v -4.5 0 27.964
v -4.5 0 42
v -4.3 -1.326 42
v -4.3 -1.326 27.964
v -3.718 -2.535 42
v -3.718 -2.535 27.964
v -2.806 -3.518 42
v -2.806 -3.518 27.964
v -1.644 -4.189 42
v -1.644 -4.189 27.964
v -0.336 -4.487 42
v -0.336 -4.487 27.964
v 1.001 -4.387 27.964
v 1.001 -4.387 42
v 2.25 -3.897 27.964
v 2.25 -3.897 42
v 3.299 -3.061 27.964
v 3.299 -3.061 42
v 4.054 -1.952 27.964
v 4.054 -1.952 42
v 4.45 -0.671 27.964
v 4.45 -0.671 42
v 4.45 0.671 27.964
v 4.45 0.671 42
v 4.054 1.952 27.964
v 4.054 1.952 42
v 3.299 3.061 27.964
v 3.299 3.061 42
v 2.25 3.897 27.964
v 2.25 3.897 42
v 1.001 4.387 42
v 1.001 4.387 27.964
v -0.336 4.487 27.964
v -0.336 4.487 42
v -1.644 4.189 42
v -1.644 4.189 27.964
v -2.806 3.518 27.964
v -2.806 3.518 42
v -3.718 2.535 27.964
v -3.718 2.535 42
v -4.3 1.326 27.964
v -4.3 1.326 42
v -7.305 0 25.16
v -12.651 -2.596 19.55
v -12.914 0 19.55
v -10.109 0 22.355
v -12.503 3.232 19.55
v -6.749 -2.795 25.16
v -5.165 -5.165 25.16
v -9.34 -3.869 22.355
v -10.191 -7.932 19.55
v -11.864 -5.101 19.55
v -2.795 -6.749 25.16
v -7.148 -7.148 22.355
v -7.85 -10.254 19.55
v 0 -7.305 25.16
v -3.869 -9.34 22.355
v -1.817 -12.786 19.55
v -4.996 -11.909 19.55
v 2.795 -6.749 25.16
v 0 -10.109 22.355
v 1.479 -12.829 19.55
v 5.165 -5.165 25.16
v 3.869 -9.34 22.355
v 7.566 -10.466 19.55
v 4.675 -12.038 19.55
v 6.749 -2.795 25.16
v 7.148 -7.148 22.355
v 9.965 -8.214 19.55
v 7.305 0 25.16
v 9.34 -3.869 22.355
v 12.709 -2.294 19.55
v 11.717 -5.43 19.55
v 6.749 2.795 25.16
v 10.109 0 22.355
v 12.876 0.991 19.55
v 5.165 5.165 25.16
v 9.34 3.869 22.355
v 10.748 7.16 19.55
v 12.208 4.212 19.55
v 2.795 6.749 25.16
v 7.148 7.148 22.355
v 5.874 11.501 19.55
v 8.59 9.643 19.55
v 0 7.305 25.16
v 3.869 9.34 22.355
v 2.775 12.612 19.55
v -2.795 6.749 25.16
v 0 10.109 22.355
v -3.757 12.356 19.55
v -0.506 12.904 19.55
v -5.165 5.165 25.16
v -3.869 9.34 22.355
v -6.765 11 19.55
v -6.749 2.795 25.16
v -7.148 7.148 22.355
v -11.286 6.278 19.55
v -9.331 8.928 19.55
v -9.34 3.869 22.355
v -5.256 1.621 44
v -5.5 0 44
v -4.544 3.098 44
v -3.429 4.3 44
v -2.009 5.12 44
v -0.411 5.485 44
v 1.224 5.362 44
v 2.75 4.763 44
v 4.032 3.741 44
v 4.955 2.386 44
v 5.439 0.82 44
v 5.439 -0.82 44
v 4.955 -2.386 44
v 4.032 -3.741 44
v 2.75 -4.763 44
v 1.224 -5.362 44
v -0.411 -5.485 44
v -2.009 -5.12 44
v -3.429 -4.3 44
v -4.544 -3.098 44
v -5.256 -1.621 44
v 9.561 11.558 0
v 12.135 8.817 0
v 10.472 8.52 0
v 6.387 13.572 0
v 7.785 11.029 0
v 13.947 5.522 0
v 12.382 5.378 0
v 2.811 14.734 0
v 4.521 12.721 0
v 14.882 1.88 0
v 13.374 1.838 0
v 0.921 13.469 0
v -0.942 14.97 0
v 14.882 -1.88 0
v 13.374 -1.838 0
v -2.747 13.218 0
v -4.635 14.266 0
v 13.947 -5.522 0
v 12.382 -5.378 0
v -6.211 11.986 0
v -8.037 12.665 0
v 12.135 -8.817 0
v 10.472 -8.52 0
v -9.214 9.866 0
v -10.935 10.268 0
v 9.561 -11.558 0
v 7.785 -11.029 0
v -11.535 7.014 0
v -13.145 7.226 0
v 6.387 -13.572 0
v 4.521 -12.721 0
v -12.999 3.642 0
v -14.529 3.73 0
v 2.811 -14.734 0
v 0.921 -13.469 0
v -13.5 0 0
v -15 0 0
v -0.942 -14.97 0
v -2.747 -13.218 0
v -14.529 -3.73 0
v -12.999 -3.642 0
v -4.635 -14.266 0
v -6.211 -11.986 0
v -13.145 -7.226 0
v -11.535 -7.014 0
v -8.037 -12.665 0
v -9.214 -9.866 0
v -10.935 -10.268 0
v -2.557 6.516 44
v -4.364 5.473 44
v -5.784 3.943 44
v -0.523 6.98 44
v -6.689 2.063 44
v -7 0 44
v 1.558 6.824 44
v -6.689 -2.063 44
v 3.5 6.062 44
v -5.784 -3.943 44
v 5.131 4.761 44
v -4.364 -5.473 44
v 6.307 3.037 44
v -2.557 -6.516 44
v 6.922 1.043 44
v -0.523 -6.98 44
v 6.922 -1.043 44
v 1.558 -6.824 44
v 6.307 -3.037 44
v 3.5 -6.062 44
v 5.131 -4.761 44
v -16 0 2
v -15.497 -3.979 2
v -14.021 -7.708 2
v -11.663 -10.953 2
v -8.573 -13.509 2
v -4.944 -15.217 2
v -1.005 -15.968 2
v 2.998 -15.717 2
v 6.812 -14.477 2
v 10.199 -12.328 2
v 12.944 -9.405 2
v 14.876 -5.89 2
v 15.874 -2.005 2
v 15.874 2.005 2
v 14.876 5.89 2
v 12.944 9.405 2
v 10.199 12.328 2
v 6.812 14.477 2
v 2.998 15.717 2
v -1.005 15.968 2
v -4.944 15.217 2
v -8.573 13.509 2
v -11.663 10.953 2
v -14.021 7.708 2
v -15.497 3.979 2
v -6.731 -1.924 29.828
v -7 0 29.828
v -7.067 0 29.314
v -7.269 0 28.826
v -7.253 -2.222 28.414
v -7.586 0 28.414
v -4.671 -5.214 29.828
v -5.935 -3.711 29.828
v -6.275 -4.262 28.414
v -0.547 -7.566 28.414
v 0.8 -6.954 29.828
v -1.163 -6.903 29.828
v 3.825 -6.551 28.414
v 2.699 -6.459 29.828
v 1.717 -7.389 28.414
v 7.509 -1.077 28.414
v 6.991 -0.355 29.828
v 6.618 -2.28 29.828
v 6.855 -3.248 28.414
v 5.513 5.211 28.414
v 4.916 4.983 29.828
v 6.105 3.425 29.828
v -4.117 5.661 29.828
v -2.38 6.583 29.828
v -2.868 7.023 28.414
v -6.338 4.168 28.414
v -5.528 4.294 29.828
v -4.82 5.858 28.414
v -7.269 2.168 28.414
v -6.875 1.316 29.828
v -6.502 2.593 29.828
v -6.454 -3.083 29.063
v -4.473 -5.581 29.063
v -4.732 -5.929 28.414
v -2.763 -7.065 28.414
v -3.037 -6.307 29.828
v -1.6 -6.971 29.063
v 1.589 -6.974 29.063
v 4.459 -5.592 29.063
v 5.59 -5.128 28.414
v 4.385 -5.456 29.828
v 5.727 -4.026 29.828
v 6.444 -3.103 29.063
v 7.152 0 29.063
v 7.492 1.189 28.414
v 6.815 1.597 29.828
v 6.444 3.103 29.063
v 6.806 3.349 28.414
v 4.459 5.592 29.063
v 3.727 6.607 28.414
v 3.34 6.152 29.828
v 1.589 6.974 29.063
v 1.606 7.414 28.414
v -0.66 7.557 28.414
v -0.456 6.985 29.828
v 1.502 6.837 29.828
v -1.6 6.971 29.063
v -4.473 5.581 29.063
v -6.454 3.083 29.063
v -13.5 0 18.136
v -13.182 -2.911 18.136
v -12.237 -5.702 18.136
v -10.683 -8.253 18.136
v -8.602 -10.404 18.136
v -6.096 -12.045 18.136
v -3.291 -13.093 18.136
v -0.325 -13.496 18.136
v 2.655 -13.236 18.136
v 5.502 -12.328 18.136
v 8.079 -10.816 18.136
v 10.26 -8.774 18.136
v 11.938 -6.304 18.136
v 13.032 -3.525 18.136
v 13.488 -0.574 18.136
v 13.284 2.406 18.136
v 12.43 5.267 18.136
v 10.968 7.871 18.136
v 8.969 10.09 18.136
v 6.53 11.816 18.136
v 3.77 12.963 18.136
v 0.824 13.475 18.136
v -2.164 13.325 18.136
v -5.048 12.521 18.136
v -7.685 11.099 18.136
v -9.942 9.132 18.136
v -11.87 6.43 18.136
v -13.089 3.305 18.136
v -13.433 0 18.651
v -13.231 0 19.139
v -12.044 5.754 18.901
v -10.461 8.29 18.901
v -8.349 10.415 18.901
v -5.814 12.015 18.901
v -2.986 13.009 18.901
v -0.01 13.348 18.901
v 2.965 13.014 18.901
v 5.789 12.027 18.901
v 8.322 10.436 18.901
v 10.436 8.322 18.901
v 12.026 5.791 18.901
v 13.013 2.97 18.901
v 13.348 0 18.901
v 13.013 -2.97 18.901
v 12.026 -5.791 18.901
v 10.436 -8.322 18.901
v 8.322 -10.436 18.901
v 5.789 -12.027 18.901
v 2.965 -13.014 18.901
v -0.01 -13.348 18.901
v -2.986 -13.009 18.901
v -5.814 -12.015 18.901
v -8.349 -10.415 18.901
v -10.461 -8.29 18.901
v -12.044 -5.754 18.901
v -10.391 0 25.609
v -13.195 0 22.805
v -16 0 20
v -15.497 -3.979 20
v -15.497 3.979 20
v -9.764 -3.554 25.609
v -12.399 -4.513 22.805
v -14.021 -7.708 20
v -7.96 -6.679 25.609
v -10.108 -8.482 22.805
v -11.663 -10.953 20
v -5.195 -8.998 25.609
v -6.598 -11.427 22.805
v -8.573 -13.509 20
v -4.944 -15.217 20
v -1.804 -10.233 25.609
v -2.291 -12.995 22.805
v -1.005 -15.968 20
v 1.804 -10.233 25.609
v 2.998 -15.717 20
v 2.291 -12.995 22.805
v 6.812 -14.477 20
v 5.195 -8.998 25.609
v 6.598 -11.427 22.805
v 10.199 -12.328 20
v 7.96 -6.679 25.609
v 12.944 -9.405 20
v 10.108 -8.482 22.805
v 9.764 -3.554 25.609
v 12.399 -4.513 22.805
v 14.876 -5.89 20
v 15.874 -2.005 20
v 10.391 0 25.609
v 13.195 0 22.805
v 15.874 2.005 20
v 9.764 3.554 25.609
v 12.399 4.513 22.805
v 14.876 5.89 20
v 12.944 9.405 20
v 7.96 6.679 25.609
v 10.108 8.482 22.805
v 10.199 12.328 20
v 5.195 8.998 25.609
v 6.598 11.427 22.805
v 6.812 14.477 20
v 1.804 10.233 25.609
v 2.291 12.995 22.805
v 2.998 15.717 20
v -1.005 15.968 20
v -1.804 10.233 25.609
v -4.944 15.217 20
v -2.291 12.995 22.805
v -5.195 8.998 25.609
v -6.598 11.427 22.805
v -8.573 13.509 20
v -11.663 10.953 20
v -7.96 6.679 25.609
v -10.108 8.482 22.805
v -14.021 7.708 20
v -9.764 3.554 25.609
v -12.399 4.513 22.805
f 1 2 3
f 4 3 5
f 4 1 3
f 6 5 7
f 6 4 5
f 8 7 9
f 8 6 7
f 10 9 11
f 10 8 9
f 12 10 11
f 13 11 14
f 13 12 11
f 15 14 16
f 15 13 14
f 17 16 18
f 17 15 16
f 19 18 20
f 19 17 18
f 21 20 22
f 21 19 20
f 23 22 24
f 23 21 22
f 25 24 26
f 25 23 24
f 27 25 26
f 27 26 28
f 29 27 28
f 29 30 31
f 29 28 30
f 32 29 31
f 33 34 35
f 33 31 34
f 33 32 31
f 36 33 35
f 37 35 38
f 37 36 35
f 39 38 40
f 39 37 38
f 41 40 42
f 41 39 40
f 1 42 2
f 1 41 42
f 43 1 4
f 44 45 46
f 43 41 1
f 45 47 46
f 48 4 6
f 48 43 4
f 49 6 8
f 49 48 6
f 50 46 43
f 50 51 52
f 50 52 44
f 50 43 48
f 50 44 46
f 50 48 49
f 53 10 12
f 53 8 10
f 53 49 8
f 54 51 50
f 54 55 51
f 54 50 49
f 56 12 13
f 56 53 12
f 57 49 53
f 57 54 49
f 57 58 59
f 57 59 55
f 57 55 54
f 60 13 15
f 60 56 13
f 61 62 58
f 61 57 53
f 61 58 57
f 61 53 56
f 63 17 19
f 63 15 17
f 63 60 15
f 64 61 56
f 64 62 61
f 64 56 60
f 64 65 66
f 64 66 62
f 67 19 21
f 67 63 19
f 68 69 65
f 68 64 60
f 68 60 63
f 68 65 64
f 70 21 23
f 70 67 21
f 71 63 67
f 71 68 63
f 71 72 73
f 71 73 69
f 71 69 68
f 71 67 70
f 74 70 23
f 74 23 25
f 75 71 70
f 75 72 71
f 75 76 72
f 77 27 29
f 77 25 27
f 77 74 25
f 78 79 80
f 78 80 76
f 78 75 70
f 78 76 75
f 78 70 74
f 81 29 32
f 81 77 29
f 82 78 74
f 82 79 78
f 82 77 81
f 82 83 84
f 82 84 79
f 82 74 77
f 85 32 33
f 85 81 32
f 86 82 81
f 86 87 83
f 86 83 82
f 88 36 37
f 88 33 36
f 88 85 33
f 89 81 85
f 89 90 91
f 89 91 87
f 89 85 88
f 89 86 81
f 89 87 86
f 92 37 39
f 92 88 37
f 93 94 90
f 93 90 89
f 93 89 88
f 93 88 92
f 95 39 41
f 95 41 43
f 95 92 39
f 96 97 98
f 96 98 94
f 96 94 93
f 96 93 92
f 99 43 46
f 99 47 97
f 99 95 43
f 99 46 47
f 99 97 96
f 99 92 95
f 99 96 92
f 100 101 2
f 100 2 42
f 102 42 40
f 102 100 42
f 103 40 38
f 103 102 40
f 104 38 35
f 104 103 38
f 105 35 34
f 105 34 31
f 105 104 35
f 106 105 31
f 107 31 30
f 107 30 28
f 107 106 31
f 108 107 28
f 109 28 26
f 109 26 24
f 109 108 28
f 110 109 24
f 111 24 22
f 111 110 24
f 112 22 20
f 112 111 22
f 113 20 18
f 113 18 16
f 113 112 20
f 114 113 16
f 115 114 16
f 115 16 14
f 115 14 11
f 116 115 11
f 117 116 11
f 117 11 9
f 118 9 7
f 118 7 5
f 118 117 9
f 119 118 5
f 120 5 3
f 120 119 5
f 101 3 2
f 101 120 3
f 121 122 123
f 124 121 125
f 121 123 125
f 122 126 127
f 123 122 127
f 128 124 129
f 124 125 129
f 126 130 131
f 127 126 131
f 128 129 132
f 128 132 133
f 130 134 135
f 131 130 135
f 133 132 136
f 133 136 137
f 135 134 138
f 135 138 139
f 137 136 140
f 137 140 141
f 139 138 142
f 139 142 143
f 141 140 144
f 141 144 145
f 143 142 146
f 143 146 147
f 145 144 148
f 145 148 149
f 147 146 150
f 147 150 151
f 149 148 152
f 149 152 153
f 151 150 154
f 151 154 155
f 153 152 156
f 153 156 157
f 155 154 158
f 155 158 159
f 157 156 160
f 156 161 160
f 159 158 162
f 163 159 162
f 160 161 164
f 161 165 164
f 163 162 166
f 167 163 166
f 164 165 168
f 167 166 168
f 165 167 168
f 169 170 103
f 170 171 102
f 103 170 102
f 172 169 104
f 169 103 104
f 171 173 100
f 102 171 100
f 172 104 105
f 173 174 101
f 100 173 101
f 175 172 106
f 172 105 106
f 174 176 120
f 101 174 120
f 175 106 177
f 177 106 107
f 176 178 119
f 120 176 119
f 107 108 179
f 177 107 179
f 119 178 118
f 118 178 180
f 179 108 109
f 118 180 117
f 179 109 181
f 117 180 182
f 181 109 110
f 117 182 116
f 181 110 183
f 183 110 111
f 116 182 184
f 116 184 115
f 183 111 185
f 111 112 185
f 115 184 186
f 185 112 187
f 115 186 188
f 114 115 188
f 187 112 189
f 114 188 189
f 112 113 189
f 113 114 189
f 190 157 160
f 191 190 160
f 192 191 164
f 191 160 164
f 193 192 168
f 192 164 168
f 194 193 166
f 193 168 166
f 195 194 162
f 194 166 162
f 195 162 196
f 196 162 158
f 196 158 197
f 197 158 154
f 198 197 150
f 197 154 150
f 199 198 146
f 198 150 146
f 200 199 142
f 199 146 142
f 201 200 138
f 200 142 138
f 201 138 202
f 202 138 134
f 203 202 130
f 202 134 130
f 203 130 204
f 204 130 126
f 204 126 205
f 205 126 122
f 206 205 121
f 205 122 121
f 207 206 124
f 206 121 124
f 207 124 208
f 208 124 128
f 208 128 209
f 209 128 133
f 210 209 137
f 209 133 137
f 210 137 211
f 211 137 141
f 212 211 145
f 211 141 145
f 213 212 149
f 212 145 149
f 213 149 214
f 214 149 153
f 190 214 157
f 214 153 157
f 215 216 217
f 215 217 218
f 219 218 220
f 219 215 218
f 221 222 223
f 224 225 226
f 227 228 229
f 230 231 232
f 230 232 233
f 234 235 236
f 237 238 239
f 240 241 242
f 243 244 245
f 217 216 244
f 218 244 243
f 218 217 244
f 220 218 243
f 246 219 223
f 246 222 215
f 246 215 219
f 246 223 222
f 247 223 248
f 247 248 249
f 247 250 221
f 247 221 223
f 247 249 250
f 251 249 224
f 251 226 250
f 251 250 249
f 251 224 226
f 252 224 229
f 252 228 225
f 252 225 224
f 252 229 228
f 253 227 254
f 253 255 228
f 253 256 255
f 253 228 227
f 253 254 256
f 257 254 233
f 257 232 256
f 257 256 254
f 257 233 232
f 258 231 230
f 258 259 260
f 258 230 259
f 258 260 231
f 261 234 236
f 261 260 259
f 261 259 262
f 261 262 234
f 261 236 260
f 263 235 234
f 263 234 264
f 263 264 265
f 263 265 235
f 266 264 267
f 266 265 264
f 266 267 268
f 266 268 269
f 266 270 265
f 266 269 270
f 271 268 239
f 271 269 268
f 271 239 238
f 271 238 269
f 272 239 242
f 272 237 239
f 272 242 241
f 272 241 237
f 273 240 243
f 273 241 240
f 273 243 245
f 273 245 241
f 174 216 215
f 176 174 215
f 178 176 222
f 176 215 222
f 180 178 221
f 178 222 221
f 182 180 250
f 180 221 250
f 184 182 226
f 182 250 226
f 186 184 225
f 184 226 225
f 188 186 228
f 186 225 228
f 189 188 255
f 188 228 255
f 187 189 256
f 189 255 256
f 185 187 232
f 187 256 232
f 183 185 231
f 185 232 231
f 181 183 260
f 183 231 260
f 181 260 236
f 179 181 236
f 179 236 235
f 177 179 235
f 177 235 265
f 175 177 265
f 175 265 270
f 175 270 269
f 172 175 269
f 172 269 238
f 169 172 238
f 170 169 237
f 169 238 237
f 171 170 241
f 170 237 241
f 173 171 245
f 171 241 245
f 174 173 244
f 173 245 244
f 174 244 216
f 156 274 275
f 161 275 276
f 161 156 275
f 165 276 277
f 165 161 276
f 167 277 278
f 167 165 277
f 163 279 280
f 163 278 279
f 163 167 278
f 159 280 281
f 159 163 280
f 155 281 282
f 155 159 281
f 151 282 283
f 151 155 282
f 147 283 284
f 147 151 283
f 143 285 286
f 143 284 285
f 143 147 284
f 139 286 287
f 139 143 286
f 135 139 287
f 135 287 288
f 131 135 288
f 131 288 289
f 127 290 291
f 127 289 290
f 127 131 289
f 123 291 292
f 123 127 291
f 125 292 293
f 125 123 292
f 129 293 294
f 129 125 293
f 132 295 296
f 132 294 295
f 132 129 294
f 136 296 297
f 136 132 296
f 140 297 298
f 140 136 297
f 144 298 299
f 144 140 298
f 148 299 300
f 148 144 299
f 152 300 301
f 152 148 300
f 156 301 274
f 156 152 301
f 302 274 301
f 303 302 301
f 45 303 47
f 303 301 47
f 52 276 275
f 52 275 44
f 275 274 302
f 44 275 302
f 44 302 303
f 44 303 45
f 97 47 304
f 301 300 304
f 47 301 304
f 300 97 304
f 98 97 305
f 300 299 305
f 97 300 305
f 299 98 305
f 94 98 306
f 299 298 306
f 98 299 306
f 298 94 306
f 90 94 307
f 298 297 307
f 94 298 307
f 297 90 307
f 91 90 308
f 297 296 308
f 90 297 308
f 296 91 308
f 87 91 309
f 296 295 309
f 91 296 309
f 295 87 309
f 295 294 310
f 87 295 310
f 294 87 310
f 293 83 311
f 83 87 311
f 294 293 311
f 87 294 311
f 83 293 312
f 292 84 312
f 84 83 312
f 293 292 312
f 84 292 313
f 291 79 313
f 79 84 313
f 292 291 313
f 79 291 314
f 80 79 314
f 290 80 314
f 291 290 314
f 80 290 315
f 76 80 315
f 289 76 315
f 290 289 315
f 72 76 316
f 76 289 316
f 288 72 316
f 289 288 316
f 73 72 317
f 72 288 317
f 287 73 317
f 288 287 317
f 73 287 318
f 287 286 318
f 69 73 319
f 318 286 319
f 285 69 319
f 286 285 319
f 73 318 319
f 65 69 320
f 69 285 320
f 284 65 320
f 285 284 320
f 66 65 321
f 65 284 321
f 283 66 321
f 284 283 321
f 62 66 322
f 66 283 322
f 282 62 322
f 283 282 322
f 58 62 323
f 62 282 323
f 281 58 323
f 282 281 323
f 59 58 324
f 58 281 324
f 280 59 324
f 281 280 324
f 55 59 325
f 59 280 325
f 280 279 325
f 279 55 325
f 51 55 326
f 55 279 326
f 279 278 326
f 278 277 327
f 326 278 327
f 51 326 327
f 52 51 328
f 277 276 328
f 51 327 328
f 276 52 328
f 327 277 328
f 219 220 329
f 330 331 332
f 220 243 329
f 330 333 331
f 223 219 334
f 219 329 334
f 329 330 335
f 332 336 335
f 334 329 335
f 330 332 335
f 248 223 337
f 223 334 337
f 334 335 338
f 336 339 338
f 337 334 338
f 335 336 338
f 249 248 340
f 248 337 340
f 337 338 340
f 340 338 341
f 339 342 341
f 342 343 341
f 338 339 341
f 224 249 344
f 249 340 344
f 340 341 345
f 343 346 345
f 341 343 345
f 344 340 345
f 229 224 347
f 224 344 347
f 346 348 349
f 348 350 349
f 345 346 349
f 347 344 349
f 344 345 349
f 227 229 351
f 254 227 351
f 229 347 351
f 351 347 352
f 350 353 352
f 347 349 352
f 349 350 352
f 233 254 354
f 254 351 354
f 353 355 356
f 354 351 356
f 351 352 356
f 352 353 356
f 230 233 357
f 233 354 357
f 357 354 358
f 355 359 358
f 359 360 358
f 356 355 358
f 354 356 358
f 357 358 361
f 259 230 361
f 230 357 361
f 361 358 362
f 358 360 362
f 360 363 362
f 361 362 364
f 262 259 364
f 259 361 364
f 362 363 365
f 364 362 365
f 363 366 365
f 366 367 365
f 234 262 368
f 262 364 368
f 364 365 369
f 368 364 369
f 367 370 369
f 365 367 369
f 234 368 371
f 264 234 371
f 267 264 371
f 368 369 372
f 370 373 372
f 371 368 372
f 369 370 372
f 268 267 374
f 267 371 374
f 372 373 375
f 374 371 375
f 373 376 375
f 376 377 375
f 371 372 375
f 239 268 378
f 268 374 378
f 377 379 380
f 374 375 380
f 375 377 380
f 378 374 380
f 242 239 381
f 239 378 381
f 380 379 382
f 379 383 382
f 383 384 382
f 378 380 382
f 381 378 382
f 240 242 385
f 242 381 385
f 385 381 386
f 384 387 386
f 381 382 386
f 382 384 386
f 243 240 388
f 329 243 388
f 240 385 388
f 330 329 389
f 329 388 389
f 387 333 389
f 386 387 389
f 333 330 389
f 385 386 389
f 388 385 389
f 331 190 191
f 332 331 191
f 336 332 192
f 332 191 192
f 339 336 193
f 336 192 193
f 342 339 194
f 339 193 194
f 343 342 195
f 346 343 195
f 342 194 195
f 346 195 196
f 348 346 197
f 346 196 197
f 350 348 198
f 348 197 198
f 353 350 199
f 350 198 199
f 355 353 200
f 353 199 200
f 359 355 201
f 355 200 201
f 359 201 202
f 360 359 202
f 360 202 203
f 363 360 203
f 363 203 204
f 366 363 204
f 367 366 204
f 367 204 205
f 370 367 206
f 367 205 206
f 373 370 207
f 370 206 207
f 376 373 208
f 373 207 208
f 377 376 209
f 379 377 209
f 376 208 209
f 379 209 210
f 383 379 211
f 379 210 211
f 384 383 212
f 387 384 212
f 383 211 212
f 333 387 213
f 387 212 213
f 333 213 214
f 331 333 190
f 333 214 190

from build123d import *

# Parameters (mm, degrees)
F2_T       = -2.5
F3_R       = 2
F4_SIZE2   = 1
F4_SIZE    = 2
F4_2_SIZE2 = 1
F4_2_SIZE  = 2


with BuildPart() as f1:
    # F0 (on Front) → F1 (revolve)
    with BuildSketch(Plane.XZ):
        Polygon((0, 0), (0, 44), (-7, 44), (-7, 29), (-16, 20), (-16, 0), align=None)
    revolve(axis=Axis((0, 0, 22), (0, 0, 1)))

    # F2
    f2_openings = [f1.faces().sort_by_distance(p)[0] for p in [
        (0, 0, 44),
        (0, 0, 0),
    ]]
    offset(amount=F2_T, openings=f2_openings, kind=Kind.INTERSECTION)

    # F3
    f3_edges = [f1.edges().sort_by_distance(p)[0] for p in [
        (7, 0, 29),
        (13.5, 0, 18.964466),
    ]]
    fillet(f3_edges, radius=F3_R)

    # F4
    f4_edges = [f1.edges().sort_by_distance(p)[0] for p in [
        (16, 0, 0),
    ]]
    f4_side = f1.faces().sort_by_distance((16, 0, 10))[0]
    chamfer(f4_edges, length=F4_SIZE, length2=F4_SIZE2, reference=f4_side)

    # F4#2
    f4_2_edges = [f1.edges().sort_by_distance(p)[0] for p in [
        (4.5, 0, 44),
    ]]
    f4_2_side = f1.faces().sort_by_distance((4.5, 0, 35.982233))[0]
    chamfer(f4_2_edges, length=F4_2_SIZE, length2=F4_2_SIZE2, reference=f4_2_side)


solid = f1.part
